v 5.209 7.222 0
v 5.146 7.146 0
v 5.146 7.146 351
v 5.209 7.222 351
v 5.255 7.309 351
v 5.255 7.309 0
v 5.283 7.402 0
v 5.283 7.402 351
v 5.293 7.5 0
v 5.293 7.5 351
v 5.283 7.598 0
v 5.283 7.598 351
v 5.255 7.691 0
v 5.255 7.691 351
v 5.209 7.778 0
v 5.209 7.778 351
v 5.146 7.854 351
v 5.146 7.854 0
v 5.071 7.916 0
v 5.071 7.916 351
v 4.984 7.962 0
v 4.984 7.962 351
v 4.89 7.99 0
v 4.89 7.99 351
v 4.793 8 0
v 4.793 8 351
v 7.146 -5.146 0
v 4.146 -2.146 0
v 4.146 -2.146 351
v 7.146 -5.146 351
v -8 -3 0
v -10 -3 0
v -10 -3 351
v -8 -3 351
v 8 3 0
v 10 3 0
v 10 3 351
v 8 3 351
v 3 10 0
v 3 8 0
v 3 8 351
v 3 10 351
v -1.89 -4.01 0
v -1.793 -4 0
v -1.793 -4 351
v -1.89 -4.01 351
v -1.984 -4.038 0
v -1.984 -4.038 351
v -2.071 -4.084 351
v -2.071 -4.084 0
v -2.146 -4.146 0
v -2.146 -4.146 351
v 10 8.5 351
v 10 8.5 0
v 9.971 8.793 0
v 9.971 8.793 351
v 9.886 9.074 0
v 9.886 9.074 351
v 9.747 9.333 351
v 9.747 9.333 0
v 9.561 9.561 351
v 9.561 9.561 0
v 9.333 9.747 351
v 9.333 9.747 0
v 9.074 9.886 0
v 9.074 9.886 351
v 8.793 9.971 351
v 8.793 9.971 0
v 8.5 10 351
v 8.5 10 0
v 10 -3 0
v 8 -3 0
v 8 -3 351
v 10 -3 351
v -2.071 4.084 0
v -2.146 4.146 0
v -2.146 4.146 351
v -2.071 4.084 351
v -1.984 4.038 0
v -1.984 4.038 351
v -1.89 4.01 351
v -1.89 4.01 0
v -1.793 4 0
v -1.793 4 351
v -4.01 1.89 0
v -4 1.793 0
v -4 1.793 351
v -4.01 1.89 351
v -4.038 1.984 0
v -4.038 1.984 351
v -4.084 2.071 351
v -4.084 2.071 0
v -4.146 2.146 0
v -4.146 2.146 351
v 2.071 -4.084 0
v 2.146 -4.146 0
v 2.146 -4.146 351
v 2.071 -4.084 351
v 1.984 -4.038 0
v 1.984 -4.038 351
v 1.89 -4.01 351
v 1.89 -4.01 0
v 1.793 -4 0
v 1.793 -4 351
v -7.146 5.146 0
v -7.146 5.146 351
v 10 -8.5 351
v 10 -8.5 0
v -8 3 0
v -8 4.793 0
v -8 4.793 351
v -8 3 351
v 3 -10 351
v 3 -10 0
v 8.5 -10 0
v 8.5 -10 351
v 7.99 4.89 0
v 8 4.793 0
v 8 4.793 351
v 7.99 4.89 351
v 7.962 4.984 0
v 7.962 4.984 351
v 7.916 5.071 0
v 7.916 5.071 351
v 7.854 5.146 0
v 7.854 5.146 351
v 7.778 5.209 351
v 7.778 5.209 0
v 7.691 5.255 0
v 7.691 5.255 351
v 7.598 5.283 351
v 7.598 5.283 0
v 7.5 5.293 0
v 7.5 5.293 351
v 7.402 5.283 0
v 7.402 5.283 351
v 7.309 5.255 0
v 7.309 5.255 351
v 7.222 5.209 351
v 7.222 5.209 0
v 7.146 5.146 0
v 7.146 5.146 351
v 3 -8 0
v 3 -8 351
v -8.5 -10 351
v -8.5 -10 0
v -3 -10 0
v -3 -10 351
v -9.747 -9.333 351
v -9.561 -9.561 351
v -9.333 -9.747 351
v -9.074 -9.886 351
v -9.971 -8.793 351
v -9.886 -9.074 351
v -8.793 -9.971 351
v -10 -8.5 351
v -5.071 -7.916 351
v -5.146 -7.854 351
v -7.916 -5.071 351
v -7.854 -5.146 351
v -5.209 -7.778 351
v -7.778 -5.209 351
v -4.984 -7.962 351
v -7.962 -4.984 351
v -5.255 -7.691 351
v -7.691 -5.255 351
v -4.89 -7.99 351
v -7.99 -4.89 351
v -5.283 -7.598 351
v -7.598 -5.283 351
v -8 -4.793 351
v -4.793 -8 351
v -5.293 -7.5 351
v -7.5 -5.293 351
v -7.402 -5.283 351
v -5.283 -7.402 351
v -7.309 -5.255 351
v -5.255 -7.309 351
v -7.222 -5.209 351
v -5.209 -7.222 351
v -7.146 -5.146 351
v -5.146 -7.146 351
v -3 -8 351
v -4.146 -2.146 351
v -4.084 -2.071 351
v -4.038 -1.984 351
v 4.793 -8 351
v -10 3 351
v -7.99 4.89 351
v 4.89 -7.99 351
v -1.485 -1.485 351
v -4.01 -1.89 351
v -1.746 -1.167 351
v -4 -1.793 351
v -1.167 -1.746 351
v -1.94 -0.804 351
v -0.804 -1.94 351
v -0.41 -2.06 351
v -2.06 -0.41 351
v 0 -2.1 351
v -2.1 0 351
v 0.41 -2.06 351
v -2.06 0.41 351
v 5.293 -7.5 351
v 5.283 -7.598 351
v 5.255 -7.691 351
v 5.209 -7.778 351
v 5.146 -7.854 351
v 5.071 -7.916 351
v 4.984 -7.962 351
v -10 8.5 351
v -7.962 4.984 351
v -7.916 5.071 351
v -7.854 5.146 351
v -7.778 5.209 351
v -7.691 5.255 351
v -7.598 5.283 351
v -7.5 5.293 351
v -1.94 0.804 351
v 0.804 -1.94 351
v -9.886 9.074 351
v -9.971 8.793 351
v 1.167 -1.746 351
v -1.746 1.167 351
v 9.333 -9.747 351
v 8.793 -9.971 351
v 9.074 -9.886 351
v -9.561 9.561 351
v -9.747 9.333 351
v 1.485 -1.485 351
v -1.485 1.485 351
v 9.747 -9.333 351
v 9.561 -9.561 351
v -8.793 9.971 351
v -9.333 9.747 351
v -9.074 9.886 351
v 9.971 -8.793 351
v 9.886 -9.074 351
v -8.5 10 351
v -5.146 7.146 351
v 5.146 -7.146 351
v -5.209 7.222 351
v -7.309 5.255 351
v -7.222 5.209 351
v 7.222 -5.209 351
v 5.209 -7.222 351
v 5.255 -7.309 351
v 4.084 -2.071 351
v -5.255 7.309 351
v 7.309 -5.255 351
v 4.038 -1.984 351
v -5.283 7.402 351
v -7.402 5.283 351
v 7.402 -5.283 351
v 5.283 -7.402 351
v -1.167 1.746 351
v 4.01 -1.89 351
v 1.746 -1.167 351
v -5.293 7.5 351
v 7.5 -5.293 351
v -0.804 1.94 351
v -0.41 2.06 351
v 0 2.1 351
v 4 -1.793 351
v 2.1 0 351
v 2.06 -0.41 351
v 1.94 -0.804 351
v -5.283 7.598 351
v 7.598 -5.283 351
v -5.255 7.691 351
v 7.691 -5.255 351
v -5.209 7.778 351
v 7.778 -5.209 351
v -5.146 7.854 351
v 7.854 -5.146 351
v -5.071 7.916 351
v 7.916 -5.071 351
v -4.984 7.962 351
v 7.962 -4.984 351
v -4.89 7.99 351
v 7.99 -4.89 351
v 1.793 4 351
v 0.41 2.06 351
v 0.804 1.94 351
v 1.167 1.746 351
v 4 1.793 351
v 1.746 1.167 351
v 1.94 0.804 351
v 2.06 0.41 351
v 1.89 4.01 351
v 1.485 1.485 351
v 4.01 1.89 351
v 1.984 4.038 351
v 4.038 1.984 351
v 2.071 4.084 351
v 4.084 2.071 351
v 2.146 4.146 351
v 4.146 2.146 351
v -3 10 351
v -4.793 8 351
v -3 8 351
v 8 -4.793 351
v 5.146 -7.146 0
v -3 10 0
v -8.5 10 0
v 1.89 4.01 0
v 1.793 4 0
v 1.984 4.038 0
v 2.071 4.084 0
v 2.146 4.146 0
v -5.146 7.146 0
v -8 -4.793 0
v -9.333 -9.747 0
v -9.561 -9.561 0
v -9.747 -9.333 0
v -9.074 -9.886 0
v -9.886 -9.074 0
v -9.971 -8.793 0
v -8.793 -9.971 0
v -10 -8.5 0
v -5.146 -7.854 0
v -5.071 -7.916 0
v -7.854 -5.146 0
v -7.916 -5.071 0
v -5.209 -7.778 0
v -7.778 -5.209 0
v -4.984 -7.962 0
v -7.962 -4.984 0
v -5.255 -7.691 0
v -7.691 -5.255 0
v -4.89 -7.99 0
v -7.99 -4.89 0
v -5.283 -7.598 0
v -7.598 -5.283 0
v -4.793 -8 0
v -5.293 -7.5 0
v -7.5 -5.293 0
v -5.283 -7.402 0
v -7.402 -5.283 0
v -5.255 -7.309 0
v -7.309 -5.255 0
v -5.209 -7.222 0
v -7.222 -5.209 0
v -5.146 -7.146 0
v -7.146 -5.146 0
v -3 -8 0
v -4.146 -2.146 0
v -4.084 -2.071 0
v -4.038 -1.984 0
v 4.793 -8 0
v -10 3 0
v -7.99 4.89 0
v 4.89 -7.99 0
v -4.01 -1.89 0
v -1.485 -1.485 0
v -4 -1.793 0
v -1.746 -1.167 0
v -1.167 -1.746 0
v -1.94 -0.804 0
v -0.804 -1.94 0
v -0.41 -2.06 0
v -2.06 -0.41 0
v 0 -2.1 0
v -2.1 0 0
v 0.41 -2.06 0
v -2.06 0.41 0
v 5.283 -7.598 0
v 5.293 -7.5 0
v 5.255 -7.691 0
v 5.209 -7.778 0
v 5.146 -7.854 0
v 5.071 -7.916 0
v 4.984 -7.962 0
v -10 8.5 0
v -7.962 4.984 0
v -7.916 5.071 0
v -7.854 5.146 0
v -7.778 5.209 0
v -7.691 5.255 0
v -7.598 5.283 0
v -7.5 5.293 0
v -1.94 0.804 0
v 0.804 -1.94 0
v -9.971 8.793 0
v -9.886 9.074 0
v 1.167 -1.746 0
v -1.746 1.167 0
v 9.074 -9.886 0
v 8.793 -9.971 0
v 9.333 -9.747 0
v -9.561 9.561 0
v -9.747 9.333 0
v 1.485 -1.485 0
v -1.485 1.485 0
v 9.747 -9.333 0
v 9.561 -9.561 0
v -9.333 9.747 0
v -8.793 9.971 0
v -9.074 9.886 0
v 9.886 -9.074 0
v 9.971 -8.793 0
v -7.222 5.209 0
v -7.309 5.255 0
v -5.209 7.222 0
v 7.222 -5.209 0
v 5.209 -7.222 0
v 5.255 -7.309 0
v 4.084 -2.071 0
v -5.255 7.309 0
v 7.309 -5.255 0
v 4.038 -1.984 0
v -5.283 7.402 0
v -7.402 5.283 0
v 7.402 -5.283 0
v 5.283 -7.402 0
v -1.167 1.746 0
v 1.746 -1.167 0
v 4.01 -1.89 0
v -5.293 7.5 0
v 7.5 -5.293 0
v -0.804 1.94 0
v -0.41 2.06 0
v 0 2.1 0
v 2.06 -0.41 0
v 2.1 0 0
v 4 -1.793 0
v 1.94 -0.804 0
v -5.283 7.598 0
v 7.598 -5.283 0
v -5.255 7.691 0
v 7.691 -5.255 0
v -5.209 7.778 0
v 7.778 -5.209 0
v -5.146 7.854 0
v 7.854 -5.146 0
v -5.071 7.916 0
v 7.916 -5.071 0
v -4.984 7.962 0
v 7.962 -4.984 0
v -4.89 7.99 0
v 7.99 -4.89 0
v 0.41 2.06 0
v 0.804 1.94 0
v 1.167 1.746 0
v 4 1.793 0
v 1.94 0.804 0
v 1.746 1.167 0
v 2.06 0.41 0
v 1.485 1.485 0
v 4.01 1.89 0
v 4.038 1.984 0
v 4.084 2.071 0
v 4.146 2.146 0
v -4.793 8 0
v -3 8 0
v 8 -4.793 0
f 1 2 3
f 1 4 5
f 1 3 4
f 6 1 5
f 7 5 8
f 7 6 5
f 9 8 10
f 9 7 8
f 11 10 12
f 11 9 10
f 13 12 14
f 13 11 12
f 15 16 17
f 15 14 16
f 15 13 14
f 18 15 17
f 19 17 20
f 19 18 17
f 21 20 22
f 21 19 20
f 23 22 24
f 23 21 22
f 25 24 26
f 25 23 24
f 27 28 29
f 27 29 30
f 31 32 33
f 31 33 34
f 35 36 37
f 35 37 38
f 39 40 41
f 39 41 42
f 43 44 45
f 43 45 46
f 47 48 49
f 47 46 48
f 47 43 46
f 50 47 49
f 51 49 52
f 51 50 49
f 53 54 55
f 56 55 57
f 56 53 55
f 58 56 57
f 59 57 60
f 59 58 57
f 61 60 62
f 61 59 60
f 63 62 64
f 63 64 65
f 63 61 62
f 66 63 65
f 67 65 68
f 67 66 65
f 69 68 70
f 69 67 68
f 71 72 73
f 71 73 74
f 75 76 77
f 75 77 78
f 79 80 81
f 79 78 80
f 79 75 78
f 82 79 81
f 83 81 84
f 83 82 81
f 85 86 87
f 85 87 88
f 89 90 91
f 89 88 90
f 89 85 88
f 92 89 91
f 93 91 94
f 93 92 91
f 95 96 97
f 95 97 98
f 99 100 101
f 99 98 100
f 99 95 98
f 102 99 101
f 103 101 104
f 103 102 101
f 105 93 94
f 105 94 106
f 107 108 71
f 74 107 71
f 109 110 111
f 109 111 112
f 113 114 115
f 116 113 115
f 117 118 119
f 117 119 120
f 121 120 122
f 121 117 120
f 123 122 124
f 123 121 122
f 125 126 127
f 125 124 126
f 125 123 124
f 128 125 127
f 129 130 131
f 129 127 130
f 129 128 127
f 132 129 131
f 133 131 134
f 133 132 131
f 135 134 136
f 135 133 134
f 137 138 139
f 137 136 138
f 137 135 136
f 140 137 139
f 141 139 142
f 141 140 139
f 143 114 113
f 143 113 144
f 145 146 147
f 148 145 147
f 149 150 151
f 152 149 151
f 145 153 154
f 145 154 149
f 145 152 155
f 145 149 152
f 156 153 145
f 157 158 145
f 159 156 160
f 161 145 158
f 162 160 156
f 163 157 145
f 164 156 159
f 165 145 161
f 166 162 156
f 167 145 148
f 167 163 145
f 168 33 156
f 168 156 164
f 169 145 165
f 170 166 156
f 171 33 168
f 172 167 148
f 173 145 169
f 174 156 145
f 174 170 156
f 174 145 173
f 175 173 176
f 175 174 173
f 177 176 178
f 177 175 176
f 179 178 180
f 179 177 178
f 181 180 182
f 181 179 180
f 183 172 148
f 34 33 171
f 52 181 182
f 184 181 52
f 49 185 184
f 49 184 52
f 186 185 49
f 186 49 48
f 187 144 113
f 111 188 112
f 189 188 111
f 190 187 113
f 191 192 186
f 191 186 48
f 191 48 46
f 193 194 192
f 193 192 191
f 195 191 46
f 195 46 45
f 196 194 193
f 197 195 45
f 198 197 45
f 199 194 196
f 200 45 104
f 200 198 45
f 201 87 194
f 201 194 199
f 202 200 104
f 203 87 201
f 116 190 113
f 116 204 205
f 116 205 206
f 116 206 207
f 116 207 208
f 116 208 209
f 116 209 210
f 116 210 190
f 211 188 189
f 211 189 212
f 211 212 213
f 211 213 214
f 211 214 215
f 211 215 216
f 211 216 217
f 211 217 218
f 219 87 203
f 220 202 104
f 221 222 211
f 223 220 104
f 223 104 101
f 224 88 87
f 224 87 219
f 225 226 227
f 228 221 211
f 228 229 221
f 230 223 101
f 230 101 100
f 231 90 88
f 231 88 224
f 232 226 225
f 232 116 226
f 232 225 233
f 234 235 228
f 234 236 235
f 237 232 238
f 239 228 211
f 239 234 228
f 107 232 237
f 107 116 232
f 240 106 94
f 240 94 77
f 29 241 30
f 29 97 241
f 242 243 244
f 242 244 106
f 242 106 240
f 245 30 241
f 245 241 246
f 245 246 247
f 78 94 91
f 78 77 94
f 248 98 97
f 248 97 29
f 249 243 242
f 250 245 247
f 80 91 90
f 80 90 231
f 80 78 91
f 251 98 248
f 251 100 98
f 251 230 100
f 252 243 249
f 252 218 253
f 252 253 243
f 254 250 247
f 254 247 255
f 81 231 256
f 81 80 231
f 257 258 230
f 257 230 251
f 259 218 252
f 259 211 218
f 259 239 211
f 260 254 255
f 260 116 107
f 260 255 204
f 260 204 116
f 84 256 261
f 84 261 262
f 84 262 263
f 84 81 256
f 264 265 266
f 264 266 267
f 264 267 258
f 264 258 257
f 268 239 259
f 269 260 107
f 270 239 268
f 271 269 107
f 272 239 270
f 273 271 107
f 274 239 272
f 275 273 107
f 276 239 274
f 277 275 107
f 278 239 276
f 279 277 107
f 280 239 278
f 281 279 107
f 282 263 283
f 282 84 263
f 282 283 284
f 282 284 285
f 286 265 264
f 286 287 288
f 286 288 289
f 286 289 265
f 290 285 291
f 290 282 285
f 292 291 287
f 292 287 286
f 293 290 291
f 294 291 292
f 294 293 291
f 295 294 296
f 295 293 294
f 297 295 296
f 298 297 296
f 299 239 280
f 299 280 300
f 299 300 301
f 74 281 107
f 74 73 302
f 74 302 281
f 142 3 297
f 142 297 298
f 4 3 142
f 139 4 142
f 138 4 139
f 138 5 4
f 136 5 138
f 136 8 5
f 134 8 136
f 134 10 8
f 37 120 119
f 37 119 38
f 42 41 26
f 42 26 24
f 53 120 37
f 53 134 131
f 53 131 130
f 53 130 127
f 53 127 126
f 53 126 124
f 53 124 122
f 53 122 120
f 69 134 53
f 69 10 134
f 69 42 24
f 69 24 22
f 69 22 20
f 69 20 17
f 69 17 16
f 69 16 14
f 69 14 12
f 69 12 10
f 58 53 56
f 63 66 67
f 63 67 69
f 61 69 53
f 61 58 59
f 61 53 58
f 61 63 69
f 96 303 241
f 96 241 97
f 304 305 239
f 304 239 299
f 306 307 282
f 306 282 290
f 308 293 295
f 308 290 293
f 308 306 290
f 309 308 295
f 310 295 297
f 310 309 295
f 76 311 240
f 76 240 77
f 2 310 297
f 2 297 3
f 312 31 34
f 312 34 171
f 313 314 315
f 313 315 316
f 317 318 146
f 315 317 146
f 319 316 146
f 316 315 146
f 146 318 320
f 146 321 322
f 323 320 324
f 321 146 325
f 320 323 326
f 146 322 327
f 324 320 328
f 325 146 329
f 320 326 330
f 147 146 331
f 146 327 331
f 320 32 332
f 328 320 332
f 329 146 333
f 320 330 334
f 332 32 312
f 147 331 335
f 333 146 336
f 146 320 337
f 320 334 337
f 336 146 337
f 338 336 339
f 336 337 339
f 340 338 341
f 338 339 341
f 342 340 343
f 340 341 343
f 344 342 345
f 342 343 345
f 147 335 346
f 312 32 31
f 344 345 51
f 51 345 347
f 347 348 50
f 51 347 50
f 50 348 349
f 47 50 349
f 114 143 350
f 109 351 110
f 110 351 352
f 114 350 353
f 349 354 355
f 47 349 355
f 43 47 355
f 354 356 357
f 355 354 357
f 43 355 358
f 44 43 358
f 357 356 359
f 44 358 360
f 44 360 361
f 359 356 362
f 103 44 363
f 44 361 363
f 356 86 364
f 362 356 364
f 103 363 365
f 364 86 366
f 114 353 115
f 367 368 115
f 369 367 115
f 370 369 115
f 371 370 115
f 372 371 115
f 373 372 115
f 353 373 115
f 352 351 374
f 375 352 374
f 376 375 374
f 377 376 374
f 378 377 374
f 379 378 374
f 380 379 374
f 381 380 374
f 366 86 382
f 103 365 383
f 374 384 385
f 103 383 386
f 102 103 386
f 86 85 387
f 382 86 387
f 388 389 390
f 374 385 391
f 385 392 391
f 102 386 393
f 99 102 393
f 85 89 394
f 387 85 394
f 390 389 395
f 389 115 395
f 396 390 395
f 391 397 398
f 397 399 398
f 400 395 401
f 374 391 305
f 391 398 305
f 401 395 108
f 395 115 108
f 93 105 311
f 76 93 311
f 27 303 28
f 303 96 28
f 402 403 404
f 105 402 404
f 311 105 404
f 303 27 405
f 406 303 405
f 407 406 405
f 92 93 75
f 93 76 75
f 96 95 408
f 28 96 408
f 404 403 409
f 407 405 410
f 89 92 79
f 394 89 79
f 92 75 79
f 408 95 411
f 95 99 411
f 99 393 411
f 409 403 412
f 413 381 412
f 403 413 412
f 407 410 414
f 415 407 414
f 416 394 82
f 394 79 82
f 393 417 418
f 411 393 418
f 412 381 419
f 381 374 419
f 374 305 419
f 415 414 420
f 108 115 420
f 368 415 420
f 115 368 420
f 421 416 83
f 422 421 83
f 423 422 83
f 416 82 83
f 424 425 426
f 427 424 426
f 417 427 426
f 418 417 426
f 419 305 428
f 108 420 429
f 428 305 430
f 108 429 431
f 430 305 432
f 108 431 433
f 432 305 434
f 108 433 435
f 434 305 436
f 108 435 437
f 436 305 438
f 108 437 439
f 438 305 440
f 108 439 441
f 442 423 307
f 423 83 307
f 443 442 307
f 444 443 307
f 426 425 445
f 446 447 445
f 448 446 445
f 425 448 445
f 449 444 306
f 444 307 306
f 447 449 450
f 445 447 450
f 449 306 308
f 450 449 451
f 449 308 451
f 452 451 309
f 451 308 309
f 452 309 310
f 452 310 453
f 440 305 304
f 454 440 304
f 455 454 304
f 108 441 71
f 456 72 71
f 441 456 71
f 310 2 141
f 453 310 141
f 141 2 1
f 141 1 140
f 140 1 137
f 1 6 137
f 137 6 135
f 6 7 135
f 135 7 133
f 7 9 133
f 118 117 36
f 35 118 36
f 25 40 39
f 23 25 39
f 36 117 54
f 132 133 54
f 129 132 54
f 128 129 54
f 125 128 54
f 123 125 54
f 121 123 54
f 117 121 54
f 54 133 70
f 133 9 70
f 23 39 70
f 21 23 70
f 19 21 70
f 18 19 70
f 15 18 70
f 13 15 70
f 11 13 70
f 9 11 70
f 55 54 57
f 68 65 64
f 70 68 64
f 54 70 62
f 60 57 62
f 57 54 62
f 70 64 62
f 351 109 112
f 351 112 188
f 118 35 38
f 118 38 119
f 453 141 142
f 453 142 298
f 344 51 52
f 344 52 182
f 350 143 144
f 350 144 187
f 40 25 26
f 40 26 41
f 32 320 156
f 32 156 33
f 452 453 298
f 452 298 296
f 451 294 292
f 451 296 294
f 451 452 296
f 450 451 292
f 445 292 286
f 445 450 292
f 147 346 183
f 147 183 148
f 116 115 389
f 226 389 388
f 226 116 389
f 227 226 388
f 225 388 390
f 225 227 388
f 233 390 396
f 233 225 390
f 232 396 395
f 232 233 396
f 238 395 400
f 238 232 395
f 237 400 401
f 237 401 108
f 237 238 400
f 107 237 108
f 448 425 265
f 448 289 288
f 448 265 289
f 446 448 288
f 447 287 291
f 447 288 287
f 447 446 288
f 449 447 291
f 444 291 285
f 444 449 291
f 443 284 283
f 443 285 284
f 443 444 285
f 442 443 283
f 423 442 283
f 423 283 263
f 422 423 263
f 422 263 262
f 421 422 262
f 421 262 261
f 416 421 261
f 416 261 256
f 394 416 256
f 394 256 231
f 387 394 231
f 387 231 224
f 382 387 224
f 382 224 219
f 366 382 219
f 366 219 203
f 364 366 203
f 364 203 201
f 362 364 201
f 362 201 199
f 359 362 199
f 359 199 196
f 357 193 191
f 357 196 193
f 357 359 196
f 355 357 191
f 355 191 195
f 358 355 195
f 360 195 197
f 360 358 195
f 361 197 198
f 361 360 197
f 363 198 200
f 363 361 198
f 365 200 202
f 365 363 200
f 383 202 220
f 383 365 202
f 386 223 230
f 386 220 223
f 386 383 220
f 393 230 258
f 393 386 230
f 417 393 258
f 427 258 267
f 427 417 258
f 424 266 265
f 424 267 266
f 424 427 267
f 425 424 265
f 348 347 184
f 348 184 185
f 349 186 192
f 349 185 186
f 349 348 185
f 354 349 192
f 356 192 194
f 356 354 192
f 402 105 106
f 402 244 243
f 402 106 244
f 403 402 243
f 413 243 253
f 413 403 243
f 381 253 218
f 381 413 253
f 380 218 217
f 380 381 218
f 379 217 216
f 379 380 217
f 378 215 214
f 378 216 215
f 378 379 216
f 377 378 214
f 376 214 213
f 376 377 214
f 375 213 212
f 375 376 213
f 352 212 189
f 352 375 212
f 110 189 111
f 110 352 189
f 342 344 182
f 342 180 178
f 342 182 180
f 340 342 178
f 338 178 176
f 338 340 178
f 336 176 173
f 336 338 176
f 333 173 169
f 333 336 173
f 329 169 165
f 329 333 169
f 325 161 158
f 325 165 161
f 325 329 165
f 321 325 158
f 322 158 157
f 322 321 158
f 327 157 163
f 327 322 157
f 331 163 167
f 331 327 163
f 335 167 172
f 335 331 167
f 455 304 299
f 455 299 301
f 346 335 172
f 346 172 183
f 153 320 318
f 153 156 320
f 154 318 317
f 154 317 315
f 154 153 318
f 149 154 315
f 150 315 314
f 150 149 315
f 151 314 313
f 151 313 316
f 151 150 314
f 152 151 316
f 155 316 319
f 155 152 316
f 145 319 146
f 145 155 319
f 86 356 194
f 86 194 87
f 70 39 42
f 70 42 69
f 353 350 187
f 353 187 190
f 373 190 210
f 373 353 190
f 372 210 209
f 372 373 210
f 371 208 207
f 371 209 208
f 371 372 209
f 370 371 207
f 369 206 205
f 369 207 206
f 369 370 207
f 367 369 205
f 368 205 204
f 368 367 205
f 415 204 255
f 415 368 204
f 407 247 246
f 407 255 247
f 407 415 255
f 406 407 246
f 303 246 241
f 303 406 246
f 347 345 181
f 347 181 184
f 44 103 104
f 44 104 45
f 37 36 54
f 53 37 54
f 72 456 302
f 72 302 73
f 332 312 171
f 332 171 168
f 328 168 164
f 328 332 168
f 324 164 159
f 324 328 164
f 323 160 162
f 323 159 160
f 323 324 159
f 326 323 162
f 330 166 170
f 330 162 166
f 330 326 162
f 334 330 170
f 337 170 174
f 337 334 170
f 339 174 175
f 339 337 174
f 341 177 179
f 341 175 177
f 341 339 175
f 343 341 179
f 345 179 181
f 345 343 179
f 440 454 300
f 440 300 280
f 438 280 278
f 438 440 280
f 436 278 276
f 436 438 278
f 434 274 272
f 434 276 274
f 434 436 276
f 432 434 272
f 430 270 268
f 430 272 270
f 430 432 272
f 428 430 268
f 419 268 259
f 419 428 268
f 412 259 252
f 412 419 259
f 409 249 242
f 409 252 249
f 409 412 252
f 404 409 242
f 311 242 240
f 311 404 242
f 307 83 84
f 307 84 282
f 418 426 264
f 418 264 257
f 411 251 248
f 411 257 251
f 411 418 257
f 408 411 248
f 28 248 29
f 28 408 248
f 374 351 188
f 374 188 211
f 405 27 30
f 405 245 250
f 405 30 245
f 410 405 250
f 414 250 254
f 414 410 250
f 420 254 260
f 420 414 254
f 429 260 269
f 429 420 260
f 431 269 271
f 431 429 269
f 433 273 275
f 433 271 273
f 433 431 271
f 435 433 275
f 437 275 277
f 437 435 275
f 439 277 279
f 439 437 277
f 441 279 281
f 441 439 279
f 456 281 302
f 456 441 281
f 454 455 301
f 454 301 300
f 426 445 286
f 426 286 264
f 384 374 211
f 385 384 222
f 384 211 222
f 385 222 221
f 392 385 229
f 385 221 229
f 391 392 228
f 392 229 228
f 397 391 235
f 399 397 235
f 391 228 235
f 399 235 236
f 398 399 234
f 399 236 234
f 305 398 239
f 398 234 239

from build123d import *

# Parameters (mm, degrees)
SKETCH_2_W               = 20
SKETCH_2_H               = 20
EXTRUDE_1_DEPTH          = 351
FILLET_1_R               = 1.5
CUT_EXTRUDE_1_DEPTH      = 352.284784754
CUT_EXTRUDE_1_DEPTH_BACK = 352.284784754
SKETCH_3_R               = 2.1


with BuildPart() as part:
    # 草圖2 → 填料-伸長1 (new body)
    with BuildSketch(Plane.XY):
        Rectangle(SKETCH_2_W, SKETCH_2_H)
    extrude(amount=EXTRUDE_1_DEPTH)

    # 圓角1
    fillet_1_edges = [part.edges().sort_by_distance(p)[0] for p in [
        (-10, 10, 175.5),
        (10, 10, 175.5),
        (10, -10, 175.5),
        (-10, -10, 175.5),
    ]]
    fillet(fillet_1_edges, radius=FILLET_1_R)

    # 草圖3 → 除料-伸長1 (cut, two sides: drawn at the far end of the back side and taken through both)
    with BuildSketch(Plane.XY.offset(351).offset(-CUT_EXTRUDE_1_DEPTH_BACK)):
        Circle(SKETCH_3_R)
        with BuildLine():
            Line((10, 3), (8, 3))
            Line((8, 3), (8, 4.792893219))
            ThreePointArc((8, 4.792893219), (7.691341716, 5.254832985), (7.146446609, 5.146446609))
            Line((7.146446609, 5.146446609), (4.146446609, 2.146446609))
            ThreePointArc((4.146446609, 2.146446609), (4.038060234, 1.984234935), (4, 1.792893219))
            Line((4, 1.792893219), (4, -1.792893219))
            ThreePointArc((4, -1.792893219), (4.038060234, -1.984234935), (4.146446609, -2.146446609))
            Line((4.146446609, -2.146446609), (7.146446609, -5.146446609))
            ThreePointArc((7.146446609, -5.146446609), (7.691341716, -5.254832985), (8, -4.792893219))
            Line((8, -4.792893219), (8, -3))
            Line((8, -3), (10, -3))
            Line((10, -3), (10, 3))
        make_face()
        with BuildLine():
            Line((-3, -10), (3, -10))
            Line((3, -10), (3, -8))
            Line((3, -8), (4.792893219, -8))
            ThreePointArc((4.792893219, -8), (5.254832985, -7.691341716), (5.146446609, -7.146446609))
            Line((5.146446609, -7.146446609), (2.146446609, -4.146446609))
            ThreePointArc((2.146446609, -4.146446609), (1.984234935, -4.038060234), (1.792893219, -4))
            Line((1.792893219, -4), (-1.792893219, -4))
            ThreePointArc((-1.792893219, -4), (-1.984234935, -4.038060234), (-2.146446609, -4.146446609))
            Line((-2.146446609, -4.146446609), (-5.146446609, -7.146446609))
            ThreePointArc((-5.146446609, -7.146446609), (-5.254832985, -7.691341716), (-4.792893219, -8))
            Line((-4.792893219, -8), (-3, -8))
            Line((-3, -8), (-3, -10))
        make_face()
        with BuildLine():
            Line((-10, 3), (-10, -3))
            Line((-10, -3), (-8, -3))
            Line((-8, -3), (-8, -4.792893219))
            ThreePointArc((-8, -4.792893219), (-7.691341716, -5.254832985), (-7.146446609, -5.146446609))
            Line((-7.146446609, -5.146446609), (-4.146446609, -2.146446609))
            ThreePointArc((-4.146446609, -2.146446609), (-4.038060234, -1.984234935), (-4, -1.792893219))
            Line((-4, -1.792893219), (-4, 1.792893219))
            ThreePointArc((-4, 1.792893219), (-4.038060234, 1.984234935), (-4.146446609, 2.146446609))
            Line((-4.146446609, 2.146446609), (-7.146446609, 5.146446609))
            ThreePointArc((-7.146446609, 5.146446609), (-7.691341716, 5.254832985), (-8, 4.792893219))
            Line((-8, 4.792893219), (-8, 3))
            Line((-8, 3), (-10, 3))
        make_face()
        with BuildLine():
            Line((3, 10), (-3, 10))
            Line((-3, 10), (-3, 8))
            Line((-3, 8), (-4.792893219, 8))
            ThreePointArc((-4.792893219, 8), (-5.254832985, 7.691341716), (-5.146446609, 7.146446609))
            Line((-5.146446609, 7.146446609), (-2.146446609, 4.146446609))
            ThreePointArc((-2.146446609, 4.146446609), (-1.984234935, 4.038060234), (-1.792893219, 4))
            Line((-1.792893219, 4), (1.792893219, 4))
            ThreePointArc((1.792893219, 4), (1.984234935, 4.038060234), (2.146446609, 4.146446609))
            Line((2.146446609, 4.146446609), (5.146446609, 7.146446609))
            ThreePointArc((5.146446609, 7.146446609), (5.254832985, 7.691341716), (4.792893219, 8))
            Line((4.792893219, 8), (3, 8))
            Line((3, 8), (3, 10))
        make_face()
    extrude(amount=CUT_EXTRUDE_1_DEPTH + CUT_EXTRUDE_1_DEPTH_BACK, mode=Mode.SUBTRACT)


solid = part.part
